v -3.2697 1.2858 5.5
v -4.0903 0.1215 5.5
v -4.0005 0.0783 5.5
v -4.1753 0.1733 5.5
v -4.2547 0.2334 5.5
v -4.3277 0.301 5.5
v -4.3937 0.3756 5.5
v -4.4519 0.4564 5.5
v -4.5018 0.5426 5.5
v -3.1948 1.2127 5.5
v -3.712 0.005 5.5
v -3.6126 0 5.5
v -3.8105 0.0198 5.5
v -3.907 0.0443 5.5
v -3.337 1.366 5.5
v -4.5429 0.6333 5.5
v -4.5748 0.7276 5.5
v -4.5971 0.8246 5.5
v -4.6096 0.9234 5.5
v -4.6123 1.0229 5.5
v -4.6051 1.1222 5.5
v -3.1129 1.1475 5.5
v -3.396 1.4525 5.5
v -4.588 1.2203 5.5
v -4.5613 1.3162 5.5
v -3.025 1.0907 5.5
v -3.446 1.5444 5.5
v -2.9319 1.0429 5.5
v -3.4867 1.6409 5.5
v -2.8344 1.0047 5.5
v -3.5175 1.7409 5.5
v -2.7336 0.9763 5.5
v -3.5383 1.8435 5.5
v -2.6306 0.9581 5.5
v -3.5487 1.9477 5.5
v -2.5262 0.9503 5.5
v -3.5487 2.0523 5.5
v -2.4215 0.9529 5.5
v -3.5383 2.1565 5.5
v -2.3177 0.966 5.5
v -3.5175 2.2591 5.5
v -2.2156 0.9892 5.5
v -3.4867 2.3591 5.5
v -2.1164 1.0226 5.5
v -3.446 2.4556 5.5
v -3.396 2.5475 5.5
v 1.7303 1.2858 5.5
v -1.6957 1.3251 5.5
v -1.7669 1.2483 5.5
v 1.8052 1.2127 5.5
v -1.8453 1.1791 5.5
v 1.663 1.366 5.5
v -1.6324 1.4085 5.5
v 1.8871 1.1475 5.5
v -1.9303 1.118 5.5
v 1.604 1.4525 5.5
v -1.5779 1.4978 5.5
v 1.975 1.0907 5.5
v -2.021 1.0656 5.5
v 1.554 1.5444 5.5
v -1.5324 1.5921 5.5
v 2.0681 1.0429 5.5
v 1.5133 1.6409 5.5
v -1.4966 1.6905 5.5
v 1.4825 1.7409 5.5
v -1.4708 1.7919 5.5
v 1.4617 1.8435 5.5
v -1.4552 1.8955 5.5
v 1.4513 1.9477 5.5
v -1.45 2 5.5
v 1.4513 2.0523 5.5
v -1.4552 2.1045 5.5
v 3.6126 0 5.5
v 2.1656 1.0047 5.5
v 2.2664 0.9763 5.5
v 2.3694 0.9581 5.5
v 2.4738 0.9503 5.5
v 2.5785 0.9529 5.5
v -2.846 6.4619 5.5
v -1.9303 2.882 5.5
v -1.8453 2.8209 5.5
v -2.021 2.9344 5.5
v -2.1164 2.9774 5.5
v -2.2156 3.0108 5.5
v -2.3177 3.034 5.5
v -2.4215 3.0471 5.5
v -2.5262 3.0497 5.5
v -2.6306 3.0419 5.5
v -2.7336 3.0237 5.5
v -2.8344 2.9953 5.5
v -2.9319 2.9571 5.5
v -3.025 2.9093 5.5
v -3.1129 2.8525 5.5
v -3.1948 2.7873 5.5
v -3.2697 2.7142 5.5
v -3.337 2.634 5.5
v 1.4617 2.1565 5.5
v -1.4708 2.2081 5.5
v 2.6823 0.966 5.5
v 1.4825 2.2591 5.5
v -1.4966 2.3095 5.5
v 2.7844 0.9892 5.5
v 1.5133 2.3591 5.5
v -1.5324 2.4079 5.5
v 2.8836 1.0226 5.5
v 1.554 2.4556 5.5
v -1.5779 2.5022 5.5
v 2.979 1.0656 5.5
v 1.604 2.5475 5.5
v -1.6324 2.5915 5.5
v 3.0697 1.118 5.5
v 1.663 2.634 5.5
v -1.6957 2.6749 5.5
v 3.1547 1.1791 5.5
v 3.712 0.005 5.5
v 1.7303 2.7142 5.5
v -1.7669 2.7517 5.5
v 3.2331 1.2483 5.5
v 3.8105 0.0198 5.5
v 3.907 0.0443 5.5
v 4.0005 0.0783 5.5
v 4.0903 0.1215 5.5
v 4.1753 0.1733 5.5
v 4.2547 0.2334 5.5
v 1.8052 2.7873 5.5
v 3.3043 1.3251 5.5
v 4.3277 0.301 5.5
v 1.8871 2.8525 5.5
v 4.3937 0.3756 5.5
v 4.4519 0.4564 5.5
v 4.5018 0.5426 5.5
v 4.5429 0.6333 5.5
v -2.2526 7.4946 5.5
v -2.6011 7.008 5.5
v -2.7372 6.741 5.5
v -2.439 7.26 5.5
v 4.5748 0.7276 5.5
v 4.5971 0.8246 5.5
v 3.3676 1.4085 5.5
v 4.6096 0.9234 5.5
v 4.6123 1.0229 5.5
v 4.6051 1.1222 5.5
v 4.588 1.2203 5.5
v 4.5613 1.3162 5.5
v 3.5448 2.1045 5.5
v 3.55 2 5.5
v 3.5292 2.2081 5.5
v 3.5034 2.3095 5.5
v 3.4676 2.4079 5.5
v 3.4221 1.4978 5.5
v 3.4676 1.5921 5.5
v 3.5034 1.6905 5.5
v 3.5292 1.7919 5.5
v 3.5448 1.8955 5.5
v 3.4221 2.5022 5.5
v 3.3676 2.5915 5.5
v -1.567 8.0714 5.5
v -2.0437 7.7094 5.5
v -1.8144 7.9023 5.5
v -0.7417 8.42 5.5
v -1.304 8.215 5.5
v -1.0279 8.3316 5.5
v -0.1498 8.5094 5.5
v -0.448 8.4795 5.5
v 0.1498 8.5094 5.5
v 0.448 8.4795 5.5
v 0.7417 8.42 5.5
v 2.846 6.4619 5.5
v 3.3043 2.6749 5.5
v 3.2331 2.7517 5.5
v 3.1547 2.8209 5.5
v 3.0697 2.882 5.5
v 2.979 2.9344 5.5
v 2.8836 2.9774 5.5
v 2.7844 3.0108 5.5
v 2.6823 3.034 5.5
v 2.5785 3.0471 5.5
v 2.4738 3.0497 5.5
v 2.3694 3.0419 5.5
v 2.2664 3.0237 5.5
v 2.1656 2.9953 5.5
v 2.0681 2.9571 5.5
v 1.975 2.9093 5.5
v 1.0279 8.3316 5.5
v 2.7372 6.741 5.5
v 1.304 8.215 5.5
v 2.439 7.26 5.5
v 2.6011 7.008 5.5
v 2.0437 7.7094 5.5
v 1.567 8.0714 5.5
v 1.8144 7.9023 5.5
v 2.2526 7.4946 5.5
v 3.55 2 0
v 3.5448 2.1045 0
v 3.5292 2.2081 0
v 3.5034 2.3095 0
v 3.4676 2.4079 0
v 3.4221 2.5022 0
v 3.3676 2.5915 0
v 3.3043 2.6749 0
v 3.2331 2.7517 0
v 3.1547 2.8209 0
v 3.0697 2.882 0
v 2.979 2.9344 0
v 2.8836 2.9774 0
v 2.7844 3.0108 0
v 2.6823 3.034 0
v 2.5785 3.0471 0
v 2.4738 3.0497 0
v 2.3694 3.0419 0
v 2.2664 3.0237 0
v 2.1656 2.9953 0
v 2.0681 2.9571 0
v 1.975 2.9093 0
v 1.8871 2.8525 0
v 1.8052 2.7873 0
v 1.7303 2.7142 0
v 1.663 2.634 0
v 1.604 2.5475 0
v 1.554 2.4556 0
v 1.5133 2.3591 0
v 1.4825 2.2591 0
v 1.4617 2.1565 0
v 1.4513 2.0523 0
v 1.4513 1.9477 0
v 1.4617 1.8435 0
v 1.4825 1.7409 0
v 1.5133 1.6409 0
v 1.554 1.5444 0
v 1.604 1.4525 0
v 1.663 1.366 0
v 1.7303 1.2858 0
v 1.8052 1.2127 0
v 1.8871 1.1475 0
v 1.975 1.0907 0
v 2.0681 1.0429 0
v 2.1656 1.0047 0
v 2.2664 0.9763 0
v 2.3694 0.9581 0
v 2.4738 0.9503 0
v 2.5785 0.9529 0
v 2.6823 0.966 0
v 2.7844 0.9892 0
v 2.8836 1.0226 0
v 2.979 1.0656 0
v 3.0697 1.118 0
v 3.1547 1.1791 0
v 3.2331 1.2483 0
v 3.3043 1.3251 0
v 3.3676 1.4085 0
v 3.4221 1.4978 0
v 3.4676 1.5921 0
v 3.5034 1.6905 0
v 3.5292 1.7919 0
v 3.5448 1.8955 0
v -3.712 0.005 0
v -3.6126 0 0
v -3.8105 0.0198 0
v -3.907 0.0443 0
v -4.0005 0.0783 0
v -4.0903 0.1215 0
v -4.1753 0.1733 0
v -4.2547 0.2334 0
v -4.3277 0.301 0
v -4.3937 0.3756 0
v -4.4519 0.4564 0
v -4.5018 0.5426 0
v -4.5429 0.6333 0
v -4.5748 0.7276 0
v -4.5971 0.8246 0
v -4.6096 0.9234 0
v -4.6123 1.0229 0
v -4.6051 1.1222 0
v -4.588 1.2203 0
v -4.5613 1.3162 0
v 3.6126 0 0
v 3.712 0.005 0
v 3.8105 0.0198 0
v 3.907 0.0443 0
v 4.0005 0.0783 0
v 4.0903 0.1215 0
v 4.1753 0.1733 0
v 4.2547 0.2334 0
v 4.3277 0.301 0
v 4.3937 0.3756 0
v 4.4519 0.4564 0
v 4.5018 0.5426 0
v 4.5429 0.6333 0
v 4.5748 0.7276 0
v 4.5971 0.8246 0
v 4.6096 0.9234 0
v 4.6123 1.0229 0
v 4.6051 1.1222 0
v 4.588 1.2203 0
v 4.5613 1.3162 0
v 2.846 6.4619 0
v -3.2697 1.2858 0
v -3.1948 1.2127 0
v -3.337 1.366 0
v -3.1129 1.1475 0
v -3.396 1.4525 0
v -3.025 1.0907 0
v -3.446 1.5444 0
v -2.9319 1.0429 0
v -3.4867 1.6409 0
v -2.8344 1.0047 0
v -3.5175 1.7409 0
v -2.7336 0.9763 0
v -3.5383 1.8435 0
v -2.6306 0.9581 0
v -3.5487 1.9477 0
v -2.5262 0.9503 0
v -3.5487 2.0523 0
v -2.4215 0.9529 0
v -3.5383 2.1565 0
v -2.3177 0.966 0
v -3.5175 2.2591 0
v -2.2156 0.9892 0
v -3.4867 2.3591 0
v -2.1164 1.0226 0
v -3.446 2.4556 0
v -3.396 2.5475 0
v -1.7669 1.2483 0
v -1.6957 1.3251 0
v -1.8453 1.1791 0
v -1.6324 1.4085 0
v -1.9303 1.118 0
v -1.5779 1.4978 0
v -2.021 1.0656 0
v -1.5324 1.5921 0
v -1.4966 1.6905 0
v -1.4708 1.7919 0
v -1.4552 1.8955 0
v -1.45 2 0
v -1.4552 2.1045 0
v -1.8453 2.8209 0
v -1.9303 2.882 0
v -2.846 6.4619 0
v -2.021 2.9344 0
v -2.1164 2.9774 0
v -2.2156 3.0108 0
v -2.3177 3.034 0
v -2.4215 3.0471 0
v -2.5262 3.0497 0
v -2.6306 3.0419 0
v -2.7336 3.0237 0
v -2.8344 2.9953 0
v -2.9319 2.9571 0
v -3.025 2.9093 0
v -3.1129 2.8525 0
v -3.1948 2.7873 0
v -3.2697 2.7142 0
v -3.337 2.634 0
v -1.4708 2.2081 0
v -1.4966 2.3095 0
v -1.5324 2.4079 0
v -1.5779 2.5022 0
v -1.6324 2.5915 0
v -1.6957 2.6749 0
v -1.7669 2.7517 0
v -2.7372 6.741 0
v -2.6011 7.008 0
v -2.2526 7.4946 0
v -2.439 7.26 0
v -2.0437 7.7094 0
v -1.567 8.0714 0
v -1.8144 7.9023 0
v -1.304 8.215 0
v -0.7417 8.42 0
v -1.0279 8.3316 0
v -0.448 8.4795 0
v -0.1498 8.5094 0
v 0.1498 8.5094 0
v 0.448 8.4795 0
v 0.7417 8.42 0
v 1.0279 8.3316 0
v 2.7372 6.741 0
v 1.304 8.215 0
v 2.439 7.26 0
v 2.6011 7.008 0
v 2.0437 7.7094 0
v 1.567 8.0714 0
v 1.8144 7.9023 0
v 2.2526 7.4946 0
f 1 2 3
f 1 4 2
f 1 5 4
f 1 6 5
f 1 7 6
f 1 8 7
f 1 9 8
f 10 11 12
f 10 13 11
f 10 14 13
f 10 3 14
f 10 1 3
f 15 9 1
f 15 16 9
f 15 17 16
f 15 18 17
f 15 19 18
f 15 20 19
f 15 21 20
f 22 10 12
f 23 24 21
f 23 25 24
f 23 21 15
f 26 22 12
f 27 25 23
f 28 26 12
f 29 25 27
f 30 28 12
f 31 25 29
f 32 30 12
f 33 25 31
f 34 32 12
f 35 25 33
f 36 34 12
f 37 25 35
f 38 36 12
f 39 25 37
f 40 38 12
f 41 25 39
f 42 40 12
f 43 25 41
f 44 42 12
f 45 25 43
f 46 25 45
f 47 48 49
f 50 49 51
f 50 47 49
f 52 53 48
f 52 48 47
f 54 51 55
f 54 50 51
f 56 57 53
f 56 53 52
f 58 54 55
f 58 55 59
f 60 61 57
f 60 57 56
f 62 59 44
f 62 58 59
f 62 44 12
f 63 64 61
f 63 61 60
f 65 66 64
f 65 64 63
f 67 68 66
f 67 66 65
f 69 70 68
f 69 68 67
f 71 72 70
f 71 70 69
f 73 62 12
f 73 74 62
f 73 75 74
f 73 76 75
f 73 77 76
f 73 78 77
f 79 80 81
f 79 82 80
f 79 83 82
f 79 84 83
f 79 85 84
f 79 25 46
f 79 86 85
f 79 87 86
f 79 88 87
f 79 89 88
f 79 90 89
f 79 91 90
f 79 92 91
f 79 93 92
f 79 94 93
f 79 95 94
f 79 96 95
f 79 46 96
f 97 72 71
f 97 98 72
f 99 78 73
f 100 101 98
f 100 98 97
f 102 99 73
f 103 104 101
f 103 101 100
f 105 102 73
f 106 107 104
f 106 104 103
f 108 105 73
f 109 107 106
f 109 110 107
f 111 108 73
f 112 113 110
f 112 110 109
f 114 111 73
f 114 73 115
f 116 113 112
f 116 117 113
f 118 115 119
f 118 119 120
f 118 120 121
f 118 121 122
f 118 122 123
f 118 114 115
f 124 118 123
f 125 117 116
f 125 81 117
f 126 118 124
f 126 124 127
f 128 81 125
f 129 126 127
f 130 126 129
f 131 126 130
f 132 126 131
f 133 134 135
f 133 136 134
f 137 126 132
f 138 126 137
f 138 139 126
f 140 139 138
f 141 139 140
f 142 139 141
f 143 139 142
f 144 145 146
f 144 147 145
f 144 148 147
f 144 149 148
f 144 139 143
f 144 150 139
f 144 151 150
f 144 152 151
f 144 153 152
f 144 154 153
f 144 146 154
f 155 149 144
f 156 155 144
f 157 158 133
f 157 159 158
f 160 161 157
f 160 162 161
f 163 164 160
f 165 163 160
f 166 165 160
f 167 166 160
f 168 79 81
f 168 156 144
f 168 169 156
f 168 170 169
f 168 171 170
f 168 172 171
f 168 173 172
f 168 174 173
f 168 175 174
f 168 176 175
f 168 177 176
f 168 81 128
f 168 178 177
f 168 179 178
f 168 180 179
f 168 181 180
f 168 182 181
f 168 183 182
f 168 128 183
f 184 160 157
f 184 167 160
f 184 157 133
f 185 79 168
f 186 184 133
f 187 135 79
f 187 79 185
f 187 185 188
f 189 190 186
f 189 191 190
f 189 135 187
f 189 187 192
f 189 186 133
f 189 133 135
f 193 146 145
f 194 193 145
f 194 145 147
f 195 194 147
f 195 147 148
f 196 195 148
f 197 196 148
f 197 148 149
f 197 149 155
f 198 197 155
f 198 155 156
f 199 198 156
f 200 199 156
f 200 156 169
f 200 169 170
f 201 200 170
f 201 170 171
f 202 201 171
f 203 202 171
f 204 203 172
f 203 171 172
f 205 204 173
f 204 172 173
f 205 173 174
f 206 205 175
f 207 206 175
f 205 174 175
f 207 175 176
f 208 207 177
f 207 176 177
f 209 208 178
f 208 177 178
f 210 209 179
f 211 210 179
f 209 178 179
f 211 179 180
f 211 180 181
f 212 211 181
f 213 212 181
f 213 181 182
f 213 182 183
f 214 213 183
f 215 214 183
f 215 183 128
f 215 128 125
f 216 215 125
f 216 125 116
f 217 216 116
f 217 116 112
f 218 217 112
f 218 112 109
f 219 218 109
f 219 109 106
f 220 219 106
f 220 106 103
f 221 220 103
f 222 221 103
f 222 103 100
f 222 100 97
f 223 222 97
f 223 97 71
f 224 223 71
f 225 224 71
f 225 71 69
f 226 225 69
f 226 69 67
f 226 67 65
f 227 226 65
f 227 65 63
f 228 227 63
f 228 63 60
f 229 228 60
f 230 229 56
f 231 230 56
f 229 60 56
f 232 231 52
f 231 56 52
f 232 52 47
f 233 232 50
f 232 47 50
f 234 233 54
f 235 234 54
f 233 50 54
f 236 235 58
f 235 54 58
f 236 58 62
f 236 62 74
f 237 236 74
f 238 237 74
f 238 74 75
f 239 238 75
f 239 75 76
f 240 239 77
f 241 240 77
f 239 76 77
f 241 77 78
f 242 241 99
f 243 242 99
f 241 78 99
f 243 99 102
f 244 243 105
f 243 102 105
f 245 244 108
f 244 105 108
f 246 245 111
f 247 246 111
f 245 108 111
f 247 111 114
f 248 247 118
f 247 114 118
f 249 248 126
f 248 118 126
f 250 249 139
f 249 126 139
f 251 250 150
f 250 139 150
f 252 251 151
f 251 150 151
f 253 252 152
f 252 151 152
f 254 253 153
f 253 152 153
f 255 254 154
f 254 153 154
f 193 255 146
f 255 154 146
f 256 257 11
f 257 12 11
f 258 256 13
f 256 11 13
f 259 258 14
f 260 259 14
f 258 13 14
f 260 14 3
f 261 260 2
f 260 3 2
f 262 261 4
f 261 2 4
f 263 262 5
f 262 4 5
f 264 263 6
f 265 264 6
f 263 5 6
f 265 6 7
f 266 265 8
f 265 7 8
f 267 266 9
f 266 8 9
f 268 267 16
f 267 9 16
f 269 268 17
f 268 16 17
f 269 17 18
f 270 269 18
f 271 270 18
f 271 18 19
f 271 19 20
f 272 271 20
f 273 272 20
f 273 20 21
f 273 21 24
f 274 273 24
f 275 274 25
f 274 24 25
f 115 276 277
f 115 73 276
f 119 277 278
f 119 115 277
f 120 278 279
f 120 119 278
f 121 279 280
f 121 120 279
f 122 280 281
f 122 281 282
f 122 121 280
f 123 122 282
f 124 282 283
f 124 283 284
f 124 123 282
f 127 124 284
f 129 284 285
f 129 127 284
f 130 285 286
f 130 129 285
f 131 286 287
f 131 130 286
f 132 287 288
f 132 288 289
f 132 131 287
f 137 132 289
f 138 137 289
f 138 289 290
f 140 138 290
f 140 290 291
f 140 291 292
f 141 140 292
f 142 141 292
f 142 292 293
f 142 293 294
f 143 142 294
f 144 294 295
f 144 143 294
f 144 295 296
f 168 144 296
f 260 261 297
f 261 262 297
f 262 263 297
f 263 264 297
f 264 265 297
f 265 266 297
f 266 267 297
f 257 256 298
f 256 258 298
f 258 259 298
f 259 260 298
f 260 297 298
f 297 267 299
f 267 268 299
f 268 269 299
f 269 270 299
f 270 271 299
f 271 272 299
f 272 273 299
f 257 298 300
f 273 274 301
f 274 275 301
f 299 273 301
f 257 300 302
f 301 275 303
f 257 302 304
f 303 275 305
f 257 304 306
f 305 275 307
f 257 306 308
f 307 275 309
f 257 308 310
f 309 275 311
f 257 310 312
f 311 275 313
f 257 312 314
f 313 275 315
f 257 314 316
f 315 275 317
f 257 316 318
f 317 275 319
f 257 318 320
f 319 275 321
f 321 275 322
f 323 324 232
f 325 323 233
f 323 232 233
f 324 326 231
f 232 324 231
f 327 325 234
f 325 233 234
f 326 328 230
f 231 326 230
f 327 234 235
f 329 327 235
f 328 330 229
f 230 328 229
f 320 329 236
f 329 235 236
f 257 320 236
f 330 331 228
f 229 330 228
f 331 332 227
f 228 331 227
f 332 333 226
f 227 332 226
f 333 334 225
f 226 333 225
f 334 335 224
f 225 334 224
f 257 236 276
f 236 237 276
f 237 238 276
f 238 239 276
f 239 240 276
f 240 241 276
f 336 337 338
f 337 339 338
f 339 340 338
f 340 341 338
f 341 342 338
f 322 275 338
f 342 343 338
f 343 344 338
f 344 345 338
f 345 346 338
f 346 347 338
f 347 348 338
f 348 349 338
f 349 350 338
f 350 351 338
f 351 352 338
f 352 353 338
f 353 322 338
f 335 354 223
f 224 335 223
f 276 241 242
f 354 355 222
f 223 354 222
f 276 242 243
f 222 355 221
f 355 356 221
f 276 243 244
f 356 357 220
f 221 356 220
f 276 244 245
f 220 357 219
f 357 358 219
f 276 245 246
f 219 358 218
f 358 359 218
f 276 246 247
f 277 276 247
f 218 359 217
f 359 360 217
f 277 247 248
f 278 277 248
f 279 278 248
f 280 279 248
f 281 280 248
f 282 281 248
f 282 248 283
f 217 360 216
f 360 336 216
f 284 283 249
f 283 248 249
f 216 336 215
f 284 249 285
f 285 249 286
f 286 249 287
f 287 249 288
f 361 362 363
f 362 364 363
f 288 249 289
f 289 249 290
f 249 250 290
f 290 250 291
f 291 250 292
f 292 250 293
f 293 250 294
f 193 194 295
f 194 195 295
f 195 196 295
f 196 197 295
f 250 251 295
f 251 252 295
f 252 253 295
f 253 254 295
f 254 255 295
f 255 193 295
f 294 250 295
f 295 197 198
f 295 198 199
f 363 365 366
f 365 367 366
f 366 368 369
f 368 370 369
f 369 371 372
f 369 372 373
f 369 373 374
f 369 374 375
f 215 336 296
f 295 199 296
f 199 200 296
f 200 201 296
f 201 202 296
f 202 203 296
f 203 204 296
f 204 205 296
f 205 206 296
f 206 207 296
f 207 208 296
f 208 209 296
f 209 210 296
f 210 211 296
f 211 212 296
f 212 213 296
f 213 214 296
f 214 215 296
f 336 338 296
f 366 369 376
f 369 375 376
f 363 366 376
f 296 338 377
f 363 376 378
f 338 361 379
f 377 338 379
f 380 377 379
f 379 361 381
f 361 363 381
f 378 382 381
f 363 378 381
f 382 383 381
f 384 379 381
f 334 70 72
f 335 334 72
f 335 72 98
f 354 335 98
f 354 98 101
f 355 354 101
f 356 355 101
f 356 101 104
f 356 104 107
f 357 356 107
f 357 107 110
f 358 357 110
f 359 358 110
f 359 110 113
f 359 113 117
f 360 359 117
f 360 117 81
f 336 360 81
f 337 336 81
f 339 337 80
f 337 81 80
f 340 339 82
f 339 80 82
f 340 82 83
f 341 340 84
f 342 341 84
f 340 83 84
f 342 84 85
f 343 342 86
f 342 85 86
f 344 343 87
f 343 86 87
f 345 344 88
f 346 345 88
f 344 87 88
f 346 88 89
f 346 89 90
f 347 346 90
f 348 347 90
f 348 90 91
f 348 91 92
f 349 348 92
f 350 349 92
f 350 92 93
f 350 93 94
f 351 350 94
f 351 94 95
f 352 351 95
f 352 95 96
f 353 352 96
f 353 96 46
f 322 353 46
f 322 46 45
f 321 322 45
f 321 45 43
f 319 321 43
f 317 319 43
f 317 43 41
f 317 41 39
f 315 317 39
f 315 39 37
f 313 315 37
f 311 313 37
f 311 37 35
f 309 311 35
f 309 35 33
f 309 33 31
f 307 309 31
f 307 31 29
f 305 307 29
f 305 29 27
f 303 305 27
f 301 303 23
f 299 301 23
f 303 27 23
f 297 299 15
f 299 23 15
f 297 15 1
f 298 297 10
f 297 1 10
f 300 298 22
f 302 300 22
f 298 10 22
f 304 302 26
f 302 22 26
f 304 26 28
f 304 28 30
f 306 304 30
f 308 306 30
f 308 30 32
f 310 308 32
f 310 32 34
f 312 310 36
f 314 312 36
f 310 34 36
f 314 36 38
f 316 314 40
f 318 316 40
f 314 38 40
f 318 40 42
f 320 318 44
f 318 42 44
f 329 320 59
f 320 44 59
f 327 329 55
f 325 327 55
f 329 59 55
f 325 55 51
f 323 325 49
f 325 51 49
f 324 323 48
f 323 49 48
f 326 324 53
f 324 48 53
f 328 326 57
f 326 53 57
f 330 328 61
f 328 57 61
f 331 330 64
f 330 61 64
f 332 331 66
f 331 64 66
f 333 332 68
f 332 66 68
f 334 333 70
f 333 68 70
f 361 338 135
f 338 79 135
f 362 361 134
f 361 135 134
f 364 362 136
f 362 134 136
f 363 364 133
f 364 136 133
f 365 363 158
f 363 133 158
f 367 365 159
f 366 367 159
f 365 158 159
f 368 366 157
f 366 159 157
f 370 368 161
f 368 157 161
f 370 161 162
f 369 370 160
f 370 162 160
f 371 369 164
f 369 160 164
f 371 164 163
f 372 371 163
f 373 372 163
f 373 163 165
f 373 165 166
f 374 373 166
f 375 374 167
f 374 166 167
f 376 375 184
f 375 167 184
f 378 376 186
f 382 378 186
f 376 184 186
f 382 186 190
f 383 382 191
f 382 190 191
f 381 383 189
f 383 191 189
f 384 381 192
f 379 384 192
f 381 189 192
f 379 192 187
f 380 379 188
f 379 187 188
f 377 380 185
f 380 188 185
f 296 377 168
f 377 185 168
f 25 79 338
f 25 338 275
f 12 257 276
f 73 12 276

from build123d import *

# Parameters (mm, degrees)
EXTRUDE_1_DEPTH     = 5.5
FILLET_1_R          = 1
SKETCH_2_R          = 1.05
CUT_EXTRUDE_1_DEPTH = 17.629066118
FILLET_2_R          = 3


with BuildPart() as part:
    # ｽｹｯﾁ1 → ﾎﾞｽ - 押し出し1 (new body)
    with BuildSketch(Plane.XY):
        Polygon((-5, 0), (5, 0), (0, 15), align=None)
    extrude(amount=EXTRUDE_1_DEPTH)

    # ﾌｨﾚｯﾄ1
    fillet_1_edges = [part.edges().sort_by_distance(p)[0] for p in [
        (5, 0, 2.75),
        (-5, 0, 2.75),
    ]]
    fillet(fillet_1_edges, radius=FILLET_1_R)

    # ｽｹｯﾁ2 → ｶｯﾄ - 押し出し1 (cut, through all)
    with BuildSketch(Plane.XY.offset(5.5)):
        with Locations((-2.5, 2)):
            Circle(SKETCH_2_R)
        with Locations((2.5, 2)):
            Circle(SKETCH_2_R)
    extrude(amount=-CUT_EXTRUDE_1_DEPTH, mode=Mode.SUBTRACT)

    # ﾌｨﾚｯﾄ2
    fillet_2_edges = [part.edges().sort_by_distance(p)[0] for p in [
        (0, 15, 2.75),
    ]]
    fillet(fillet_2_edges, radius=FILLET_2_R)


solid = part.part
